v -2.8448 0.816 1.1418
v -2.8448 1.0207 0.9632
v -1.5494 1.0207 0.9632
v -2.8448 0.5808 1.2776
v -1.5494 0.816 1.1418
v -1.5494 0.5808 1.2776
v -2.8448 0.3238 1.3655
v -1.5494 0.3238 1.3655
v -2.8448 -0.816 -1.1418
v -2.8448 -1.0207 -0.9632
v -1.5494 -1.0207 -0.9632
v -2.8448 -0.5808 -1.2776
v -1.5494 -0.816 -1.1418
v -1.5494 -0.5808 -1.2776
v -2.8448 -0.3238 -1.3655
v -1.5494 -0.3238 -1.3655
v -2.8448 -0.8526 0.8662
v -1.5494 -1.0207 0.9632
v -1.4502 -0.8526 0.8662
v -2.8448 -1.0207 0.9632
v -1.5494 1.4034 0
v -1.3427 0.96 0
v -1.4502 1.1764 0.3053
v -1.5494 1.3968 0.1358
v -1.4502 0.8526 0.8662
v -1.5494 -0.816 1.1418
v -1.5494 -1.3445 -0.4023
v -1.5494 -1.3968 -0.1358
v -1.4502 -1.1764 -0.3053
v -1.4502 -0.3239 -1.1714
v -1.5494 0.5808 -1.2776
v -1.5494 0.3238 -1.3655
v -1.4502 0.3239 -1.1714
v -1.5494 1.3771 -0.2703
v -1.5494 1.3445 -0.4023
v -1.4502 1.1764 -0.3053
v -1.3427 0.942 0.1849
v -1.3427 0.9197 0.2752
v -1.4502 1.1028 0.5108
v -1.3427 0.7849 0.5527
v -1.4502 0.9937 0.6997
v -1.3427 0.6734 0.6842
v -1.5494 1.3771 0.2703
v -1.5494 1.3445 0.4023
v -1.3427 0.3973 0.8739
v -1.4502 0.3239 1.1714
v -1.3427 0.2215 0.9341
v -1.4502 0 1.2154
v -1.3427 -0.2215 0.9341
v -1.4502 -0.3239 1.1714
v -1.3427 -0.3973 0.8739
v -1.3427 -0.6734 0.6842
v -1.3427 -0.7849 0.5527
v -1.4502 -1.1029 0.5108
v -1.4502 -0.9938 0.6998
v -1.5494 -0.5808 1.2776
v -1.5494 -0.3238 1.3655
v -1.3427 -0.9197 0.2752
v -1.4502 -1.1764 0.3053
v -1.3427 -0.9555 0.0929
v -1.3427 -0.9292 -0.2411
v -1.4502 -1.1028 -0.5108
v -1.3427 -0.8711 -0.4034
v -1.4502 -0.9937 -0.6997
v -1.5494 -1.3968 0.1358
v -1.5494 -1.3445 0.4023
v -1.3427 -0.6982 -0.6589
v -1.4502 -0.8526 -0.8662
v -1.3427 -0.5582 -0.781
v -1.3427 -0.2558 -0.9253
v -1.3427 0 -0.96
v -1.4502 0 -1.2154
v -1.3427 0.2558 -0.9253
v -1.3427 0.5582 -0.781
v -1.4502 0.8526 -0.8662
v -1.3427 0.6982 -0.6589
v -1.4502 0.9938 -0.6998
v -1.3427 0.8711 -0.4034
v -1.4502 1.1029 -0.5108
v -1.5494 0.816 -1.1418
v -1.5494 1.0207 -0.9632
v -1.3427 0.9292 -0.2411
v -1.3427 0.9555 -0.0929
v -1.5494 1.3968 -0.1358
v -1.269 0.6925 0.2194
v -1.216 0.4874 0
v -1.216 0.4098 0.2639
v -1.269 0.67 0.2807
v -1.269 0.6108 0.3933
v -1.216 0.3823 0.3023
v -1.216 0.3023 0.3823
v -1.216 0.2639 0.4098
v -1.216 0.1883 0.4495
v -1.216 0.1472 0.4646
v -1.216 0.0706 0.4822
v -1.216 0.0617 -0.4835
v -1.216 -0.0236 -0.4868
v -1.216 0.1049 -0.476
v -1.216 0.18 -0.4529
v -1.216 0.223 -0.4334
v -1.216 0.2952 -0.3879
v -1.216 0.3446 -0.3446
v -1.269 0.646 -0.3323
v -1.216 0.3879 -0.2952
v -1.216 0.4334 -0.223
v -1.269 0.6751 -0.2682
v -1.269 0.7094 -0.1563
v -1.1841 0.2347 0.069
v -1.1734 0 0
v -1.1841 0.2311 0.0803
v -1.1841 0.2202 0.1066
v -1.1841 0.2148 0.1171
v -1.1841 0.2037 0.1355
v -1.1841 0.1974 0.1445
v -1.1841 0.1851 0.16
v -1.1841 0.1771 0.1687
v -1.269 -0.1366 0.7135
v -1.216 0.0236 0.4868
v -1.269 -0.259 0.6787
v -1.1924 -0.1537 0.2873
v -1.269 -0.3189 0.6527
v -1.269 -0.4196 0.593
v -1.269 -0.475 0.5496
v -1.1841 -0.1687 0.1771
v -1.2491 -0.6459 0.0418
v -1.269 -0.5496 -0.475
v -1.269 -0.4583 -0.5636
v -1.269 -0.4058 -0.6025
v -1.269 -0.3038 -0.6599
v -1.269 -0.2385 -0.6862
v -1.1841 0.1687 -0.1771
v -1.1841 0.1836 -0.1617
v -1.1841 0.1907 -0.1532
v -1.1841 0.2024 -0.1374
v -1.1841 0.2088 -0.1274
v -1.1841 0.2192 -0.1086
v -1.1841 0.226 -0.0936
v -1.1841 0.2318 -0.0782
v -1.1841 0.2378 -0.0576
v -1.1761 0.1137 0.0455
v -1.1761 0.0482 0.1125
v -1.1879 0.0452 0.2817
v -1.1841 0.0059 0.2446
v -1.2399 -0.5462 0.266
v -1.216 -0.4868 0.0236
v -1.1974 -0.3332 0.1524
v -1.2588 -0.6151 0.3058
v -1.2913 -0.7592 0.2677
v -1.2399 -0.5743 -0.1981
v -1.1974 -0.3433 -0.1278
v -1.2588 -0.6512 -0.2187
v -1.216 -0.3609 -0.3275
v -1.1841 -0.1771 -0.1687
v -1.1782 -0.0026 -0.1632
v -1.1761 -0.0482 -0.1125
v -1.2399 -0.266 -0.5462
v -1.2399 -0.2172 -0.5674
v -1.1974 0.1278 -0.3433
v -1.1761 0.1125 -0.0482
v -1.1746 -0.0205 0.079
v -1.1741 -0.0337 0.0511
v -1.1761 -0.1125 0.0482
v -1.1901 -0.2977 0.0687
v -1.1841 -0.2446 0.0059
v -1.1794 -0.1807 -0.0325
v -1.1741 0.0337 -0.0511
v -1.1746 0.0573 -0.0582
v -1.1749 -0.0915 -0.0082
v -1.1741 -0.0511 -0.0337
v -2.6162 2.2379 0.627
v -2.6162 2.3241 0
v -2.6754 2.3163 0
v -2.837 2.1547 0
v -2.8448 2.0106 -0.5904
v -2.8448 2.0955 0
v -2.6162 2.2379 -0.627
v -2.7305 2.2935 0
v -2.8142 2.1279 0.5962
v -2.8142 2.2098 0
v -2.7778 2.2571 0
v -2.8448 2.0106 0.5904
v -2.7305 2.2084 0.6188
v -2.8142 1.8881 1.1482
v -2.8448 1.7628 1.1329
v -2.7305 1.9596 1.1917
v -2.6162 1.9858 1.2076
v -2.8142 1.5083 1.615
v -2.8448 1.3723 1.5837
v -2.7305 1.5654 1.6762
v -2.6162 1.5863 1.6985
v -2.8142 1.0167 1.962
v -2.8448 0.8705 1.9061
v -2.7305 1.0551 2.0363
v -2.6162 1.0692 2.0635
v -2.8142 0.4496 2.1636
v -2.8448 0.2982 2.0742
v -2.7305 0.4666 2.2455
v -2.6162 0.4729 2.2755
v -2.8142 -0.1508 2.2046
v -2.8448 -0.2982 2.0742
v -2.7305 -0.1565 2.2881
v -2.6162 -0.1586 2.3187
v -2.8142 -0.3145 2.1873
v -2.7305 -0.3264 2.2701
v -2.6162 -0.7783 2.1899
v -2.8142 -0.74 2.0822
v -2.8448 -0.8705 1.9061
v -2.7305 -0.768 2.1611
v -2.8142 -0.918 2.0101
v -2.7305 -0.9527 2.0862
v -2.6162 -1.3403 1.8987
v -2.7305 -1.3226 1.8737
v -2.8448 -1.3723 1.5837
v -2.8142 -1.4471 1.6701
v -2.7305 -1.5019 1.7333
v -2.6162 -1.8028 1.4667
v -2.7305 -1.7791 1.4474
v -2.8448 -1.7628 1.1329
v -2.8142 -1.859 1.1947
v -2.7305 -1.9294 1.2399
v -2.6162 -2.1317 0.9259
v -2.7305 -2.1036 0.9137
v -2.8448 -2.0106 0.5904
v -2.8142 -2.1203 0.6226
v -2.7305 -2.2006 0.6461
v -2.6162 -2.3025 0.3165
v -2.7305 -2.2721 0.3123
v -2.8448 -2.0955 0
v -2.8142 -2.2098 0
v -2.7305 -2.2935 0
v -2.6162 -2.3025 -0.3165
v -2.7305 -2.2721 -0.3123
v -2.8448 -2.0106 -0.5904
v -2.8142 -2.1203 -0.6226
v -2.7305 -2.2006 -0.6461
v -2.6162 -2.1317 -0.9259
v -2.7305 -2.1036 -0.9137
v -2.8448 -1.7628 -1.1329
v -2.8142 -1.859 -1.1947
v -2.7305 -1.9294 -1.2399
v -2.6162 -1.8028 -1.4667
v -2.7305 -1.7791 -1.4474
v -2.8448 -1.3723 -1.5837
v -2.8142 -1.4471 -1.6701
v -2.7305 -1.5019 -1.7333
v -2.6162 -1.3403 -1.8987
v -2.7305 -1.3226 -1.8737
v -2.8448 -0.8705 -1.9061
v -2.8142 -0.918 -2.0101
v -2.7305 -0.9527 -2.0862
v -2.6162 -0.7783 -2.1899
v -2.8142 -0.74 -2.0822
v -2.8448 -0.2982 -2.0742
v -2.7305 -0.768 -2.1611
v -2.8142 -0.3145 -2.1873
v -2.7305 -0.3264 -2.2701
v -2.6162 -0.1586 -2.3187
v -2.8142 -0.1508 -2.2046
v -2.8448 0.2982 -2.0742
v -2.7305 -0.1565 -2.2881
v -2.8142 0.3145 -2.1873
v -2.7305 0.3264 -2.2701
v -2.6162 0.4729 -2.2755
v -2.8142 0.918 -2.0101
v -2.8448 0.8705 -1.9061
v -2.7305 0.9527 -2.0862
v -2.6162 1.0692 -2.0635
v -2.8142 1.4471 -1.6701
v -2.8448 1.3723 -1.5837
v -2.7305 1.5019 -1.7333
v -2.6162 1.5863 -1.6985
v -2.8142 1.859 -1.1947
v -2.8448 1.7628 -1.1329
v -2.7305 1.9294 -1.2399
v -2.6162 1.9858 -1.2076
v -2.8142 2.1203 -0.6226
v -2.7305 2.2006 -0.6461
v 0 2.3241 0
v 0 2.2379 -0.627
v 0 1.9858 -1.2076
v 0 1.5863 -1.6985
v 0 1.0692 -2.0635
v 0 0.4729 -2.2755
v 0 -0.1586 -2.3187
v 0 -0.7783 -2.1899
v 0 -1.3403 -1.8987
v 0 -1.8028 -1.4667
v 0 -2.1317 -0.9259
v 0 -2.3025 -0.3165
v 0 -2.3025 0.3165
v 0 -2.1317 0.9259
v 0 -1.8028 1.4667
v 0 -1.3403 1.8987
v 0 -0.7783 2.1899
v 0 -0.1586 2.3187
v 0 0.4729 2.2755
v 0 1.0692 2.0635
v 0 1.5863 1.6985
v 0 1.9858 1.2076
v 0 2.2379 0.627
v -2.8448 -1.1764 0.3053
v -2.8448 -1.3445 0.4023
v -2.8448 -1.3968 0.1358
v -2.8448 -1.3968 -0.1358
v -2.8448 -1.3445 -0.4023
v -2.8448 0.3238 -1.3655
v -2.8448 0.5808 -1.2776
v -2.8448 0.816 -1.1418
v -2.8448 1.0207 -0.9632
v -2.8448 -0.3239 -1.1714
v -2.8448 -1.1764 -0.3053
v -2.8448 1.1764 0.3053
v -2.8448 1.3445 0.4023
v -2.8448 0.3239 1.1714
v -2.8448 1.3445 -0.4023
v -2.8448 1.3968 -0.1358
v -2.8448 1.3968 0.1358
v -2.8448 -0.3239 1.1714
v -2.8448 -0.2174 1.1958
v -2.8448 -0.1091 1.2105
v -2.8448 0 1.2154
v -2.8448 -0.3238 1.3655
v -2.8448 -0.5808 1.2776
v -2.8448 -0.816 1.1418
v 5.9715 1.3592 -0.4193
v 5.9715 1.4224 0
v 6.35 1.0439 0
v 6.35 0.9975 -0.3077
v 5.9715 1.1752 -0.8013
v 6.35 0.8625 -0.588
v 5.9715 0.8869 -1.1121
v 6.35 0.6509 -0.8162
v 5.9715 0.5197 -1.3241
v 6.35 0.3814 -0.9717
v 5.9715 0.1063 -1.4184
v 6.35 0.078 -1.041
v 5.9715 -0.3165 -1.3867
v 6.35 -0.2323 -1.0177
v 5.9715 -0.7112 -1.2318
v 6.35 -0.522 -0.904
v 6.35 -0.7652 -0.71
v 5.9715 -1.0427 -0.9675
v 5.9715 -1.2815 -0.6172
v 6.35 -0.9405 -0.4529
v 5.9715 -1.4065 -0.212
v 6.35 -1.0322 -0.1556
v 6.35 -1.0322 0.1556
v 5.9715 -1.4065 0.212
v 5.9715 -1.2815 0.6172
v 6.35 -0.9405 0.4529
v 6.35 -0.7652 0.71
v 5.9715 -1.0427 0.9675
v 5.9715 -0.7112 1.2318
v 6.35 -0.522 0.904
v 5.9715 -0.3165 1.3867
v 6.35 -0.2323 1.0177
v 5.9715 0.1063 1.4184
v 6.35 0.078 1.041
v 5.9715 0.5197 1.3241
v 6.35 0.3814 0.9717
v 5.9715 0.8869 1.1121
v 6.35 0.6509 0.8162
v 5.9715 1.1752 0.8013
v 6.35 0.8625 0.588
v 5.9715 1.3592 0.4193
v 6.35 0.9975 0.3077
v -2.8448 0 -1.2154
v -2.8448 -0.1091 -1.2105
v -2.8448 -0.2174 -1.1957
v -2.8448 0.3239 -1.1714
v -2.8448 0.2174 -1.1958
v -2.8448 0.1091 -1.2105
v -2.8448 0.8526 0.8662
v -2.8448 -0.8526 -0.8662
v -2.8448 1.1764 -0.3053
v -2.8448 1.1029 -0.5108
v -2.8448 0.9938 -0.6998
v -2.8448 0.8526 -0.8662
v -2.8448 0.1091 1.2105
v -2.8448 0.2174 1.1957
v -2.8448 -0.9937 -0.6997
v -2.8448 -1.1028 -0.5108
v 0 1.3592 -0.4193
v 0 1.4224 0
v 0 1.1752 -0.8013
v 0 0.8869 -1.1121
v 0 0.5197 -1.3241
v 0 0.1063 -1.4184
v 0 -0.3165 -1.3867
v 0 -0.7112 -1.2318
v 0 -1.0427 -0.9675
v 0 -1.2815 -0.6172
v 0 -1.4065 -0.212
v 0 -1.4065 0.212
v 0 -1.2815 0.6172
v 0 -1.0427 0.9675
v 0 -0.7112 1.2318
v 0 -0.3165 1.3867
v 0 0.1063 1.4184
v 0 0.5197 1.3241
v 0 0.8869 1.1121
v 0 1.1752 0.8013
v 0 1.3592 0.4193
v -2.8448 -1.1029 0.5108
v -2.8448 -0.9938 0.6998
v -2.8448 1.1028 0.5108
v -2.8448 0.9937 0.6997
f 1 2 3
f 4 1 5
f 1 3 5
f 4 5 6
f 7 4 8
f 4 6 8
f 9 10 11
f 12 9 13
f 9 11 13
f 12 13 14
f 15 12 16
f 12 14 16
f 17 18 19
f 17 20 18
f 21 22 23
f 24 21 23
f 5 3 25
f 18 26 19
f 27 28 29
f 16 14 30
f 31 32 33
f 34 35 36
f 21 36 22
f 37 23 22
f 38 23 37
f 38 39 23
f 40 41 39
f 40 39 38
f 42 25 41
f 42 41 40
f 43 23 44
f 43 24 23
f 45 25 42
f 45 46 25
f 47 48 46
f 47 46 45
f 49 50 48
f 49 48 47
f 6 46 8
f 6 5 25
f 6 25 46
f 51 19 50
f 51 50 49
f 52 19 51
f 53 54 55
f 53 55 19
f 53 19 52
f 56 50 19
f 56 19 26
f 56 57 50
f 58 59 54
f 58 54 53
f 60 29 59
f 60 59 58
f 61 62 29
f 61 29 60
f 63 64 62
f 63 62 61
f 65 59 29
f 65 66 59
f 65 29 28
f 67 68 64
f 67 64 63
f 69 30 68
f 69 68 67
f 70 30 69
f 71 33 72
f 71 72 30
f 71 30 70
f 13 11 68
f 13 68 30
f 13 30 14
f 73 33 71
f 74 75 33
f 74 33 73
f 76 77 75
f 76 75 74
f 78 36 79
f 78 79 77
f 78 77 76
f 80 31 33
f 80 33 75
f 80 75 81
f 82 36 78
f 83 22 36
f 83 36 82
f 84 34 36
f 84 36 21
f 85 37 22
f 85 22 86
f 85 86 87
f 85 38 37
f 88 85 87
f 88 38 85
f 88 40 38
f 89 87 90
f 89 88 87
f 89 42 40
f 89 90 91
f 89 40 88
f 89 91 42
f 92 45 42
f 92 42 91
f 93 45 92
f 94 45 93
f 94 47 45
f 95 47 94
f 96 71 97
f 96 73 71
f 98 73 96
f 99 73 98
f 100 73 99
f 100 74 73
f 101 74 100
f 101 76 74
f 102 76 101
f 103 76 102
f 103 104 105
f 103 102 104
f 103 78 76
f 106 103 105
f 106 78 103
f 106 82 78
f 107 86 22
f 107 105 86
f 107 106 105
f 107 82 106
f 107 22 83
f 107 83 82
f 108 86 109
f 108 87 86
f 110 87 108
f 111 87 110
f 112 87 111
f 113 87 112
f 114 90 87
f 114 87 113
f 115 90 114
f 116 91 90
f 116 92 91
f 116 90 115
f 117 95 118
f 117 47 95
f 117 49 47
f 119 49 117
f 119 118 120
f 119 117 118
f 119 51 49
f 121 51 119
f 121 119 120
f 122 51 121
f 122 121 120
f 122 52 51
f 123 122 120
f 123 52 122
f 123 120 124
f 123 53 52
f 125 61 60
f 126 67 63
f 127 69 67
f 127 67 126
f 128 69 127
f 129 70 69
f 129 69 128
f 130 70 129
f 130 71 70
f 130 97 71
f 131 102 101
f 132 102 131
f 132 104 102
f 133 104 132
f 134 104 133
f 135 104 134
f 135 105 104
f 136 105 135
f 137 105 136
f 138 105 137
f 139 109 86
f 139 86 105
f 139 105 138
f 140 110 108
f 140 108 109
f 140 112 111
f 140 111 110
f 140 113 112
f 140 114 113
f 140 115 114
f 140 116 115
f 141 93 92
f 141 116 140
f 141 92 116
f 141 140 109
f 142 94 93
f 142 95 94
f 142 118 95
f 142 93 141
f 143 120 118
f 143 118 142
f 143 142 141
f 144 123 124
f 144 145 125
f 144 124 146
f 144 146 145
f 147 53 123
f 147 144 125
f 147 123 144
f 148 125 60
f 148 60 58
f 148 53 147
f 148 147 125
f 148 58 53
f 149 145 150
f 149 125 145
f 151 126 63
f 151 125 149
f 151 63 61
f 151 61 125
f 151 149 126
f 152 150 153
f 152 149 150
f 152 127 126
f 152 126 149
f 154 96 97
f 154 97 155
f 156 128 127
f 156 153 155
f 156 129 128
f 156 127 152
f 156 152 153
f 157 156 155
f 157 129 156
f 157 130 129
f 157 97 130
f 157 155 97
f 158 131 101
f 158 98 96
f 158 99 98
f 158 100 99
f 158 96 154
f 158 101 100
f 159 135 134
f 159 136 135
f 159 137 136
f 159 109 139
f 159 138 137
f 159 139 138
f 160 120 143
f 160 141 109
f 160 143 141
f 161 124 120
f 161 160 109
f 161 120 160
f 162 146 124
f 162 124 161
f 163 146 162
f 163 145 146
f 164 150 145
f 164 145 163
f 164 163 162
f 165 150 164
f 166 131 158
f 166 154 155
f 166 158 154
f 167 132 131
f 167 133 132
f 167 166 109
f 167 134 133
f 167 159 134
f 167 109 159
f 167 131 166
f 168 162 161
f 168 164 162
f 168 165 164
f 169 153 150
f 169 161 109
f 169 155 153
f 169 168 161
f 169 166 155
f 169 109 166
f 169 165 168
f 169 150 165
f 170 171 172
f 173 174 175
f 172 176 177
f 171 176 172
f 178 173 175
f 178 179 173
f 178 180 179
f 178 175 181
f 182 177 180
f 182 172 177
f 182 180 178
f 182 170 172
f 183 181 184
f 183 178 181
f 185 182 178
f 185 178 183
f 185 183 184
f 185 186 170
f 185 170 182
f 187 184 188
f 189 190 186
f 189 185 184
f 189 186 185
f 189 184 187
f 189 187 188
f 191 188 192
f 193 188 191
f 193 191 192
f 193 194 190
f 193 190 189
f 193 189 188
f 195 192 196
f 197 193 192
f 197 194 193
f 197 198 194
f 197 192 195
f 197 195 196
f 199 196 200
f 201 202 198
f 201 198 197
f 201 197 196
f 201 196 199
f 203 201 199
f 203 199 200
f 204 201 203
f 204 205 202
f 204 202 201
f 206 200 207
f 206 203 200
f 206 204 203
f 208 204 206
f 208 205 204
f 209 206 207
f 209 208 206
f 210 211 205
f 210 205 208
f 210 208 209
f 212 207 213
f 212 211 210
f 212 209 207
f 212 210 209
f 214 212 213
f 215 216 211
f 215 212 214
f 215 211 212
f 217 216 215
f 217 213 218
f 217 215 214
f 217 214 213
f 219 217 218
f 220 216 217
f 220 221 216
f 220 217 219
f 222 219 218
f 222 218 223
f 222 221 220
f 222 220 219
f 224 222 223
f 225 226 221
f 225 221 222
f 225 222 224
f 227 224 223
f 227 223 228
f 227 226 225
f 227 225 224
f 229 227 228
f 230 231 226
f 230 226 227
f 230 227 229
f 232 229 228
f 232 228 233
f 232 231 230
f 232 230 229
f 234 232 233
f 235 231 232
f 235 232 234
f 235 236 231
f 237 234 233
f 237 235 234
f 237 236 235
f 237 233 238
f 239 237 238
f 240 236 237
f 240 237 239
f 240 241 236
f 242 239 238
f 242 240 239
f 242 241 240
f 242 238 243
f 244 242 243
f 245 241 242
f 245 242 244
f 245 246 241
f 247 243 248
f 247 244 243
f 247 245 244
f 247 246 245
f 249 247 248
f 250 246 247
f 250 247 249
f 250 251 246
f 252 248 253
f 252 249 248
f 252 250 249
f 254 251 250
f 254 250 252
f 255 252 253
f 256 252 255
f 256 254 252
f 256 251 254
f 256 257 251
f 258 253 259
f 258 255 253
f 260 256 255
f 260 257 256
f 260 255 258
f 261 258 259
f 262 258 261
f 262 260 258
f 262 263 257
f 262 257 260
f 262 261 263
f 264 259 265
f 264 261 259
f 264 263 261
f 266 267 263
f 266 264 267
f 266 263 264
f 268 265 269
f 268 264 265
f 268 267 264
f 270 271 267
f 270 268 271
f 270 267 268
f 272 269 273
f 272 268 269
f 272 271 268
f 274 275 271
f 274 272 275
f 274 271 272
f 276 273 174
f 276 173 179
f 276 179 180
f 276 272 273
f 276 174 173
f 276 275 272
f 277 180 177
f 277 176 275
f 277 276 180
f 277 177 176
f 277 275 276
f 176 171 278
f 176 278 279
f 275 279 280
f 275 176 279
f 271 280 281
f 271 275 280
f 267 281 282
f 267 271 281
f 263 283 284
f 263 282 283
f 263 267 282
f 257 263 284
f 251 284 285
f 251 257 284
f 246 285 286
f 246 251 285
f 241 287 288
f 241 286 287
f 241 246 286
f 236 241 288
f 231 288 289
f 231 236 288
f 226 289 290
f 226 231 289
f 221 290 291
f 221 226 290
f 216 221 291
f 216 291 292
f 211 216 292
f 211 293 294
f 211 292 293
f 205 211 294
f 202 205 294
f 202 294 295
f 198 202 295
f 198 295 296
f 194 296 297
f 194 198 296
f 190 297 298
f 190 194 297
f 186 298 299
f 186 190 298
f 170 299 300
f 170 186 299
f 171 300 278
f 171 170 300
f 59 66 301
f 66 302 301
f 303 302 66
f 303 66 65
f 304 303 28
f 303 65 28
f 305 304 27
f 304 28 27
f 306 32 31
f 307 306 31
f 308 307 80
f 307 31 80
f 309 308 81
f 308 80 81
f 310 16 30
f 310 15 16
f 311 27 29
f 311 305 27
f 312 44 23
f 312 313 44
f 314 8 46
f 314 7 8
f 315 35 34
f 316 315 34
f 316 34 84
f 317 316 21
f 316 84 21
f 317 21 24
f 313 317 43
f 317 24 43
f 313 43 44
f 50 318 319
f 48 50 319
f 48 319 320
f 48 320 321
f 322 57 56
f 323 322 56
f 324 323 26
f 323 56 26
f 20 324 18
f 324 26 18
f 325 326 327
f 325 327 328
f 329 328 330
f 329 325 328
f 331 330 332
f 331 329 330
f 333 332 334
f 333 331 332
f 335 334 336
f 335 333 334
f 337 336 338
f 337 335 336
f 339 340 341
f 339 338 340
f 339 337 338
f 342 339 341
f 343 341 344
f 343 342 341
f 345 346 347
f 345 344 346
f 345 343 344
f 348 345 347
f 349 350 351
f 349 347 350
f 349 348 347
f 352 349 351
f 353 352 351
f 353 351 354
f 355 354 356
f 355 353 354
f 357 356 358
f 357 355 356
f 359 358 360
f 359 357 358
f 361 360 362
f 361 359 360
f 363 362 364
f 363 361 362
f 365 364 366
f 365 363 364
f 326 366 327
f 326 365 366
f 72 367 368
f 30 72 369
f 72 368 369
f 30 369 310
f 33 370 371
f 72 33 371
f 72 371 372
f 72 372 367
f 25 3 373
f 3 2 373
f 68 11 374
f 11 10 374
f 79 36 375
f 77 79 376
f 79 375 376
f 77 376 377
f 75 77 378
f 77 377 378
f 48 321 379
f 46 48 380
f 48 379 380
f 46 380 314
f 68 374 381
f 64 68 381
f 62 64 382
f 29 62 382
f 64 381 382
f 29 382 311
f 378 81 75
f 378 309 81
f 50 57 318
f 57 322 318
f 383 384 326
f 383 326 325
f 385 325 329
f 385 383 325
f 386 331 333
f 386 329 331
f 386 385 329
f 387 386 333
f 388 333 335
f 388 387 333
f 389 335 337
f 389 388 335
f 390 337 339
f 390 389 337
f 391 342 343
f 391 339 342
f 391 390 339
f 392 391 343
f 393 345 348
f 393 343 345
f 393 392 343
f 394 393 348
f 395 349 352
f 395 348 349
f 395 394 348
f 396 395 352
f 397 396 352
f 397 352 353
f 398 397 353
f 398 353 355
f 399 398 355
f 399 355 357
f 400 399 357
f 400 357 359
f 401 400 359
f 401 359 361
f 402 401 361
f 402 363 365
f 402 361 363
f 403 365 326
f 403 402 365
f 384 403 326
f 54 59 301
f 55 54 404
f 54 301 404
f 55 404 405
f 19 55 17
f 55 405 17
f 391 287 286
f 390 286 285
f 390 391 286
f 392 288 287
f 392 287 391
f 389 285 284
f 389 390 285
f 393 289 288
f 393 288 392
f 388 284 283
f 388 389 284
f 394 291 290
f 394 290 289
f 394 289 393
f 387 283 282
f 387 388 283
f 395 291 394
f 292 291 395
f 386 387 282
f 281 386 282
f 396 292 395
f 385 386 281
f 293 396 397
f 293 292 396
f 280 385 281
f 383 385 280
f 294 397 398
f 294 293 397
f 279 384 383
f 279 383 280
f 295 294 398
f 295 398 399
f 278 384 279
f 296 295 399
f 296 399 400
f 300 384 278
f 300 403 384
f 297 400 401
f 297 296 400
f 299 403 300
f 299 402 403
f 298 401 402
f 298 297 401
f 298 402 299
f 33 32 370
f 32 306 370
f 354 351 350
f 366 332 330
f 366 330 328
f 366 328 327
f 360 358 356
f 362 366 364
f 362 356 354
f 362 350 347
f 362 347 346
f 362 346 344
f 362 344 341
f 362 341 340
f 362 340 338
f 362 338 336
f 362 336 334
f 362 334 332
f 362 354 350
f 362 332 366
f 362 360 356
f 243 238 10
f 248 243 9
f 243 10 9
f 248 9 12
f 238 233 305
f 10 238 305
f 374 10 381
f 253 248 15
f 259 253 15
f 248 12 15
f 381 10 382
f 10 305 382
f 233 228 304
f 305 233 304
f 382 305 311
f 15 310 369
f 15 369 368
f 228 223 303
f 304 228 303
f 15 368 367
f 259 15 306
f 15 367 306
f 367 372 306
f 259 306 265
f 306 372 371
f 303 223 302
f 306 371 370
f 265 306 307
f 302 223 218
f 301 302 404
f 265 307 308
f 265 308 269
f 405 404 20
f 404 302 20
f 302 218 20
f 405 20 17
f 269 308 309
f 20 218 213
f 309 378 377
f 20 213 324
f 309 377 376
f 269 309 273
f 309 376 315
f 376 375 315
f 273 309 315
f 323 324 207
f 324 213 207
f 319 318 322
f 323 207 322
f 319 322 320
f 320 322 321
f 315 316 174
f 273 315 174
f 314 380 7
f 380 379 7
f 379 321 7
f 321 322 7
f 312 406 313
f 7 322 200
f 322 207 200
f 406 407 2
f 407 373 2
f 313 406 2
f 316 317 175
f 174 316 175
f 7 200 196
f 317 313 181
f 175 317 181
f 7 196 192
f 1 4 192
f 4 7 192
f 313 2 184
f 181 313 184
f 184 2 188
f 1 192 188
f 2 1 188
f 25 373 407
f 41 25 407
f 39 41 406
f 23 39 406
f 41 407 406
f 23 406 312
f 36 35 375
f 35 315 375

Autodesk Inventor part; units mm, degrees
ref_plane "YZ Plane" through (0, 0, 0) normal (1, 0, 0) x (0, 1, 0)
sketch "Sketch1" plane through (0, 0, 0) normal (0, 0, 1) x (1, 0, 0)
  line L0 (-2.8448, 0) -> (6.35, 0)
  line L1 (6.35, 0) -> (6.35, 1.4224)
  line L2 (6.35, 1.4224) -> (0, 1.4224)
  line L3 (0, 1.4224) -> (0, 2.3241)
  line L4 (-7.3162, 0) -> (16.036, 0) projected
  line L5 (0, -0.4648) -> (0, 2.7889) projected
  line L6 (0, 2.3241) -> (-2.8448, 2.3241)
  line L7 (-2.8448, 0) -> (-2.8448, 2.3241)
  arc A0 (-1.1734, 0) -> (-1.5494, 1.4034) centre (-3.9802, 0) ccw
  line L8 (-2.8448, 1.4034) -> (-1.5494, 1.4034)
  line L9 (12.7, 1.4224) -> (0, 1.4224) construction
  dimension "d0" = 6.35
  dimension "d1" = 2.8448
  dimension "d2" = 2.8448
  dimension "d5" = 4.6482
  dimension "d13" = 2.8068
  dimension "d14" = 2.8068
  dimension "d15" = 1.2954
revolve "Body" add sketch "Sketch1" angle 360 about axis through (-2.8448, 0, 0) along (1, 0, 0) contours A0 L8 L7 L6 L3 L5 L0 | L5 L2 L1 L0
ref_plane "IDS_WORKPLANE{1}" through (-2.8448, 0, 0) normal (1, 0, 0) x (0, 0, -1)
sketch "Sketch2" plane through (-2.8448, 0, 0) normal (1, 0, 0) x (0, 0, -1)
  line L0 (0, -3.6027) -> (0, 5.3473) projected
  line L1 (5.6384, 0) -> (-3.6512, 0) projected
  circle A0 centre (0, 0) radius 2.3241 projected
  line L2 (1.3655, 0.3238) -> (1.1714, 0.3239)
  line L3 (0, 0) -> (1.3655, 0.3238) construction
  line L4 (0, 0) -> (4.3113, 4.0687) construction
  line L5 (0, 0) -> (0.4023, 1.3445) construction
  line L6 (0, 0) -> (0.7017, 1.2154) construction
  line L7 (0.4023, 1.3445) -> (0.3053, 1.1764)
  line L8 (0.9632, 1.0207) -> (0.8662, 0.8526)
  line L9 (0, 0) -> (0.9632, 1.0207) construction
  arc A1 (1.2154, 0) -> (1.1714, 0.3239) centre (0, 0) ccw
  arc A2 (0.8662, 0.8526) -> (0.3053, 1.1764) centre (0, 0) ccw
  arc A3 (1.4034, 0) -> (1.3655, 0.3238) centre (0, 0) ccw
  arc A4 (0.9632, 1.0207) -> (0.4023, 1.3445) centre (0, 0) ccw
  arc A5 (1.3655, 0.3238) -> (0.8276, 1.1334) centre (0, 0) ccw construction
  arc A6 (1.1714, 0.3239) -> (0.8662, 0.8526) centre (0, 0) ccw construction
  line L10 (1.3655, -0.3238) -> (1.1714, -0.3239)
  line L11 (0.4023, -1.3445) -> (0.3053, -1.1764)
  line L12 (0.9632, -1.0207) -> (0.8662, -0.8526)
  arc A7 (1.1714, -0.3239) -> (1.2154, 0) centre (0, 0) ccw
  arc A8 (0.3053, -1.1764) -> (0.8662, -0.8526) centre (0, 0) ccw
  arc A9 (1.3655, -0.3238) -> (1.4034, 0) centre (0, 0) ccw
  arc A10 (0.4023, -1.3445) -> (0.9632, -1.0207) centre (0, 0) ccw
  line L13 (-1.3655, 0.3238) -> (-1.1714, 0.3239)
  line L14 (-0.4023, 1.3445) -> (-0.3053, 1.1764)
  line L15 (-0.9632, 1.0207) -> (-0.8662, 0.8526)
  arc A11 (-1.1714, 0.3239) -> (-1.2154, 0) centre (0, 0) ccw
  arc A12 (-0.3053, 1.1764) -> (-0.8662, 0.8526) centre (0, 0) ccw
  arc A13 (-1.3655, 0.3238) -> (-1.4034, 0) centre (0, 0) ccw
  arc A14 (-0.4023, 1.3445) -> (-0.9632, 1.0207) centre (0, 0) ccw
  line L16 (-0.4023, -1.3445) -> (-0.3053, -1.1764)
  arc A15 (-0.8662, -0.8526) -> (-0.3053, -1.1764) centre (0, 0) ccw
  line L17 (-0.9632, -1.0207) -> (-0.8662, -0.8526)
  arc A16 (-0.9632, -1.0207) -> (-0.4023, -1.3445) centre (0, 0) ccw
  arc A17 (-1.2154, 0) -> (-1.1714, -0.3239) centre (0, 0) ccw
  line L18 (-1.3655, -0.3238) -> (-1.1714, -0.3239)
  arc A18 (-1.4034, 0) -> (-1.3655, -0.3238) centre (0, 0) ccw
  point P0 (0.7017, -1.2154)
  point P1 (-0.7017, 1.2154)
  point P2 (-0.7017, -1.2154)
  dimension "d19" = 0.3239
  dimension "d20" = 0.6477
  dimension "d21" = 33.316
  dimension "d22" = 2.8068
  dimension "d23" = 2.4308
extrude "Slot" add sketch "Sketch2" along normal up to next contours A1 L2 A3 L1 | L1 A9 L10 A7 | A17 L18 A18 L1 | L1 A13 L13 A11 | A4 L8 A2 L7 | L11 A8 L12 A10 | L14 A12 L15 A14 | A16 L17 A15 L16
fillet "Fillet1" radius 0.2286 1 edges at (-2.8448, -2.3241, 0)
thread "Thread" size "4-40 UNC" class "2A" standard "ANSI Unified Screw Threads" length 4.7625
chamfer "Chamfer1" distance 0.3785 distance2 0.3785 1 edges at (6.35, -1.4224, 0) measured on face at (6.35, -0.3549, 0.3144)
ref_plane "Work Plane2" through (-1.4224, 0, 0) normal (0, 0, -1) x (1, 0, 0)
equation "\"d19\" = 0.5 * SBR"
equation "\"d20\" = SBR"
equation "\"d22\" = 1.1547 * SW"
equation "\"d23\" = SW"
equation "\"d17\" = INTI"
equation "\"d24\" = RR"
equation "\"d6\" = GEL"
equation "\"d9\" = -0.5 * SPD + 0.5 * NND"
equation "\"d10\" = GUL"
equation "\"d0\" = NLG"
equation "\"d1\" = KOH"
equation "\"d2\" = NND"
equation "\"d5\" = KOD"
equation "\"d13\" = 1.1547 * SW"
equation "\"d14\" = 1.1547 * SW"
equation "\"d15\" = INTI"
equation "\"NND\" = 2.8448"
equation "\"NLG\" = 6.35"
equation "\"GEL\" = 4.7625"
equation "\"KOD\" = 4.6482"
equation "\"KOH\" = 2.8448"
equation "\"SPD\" = GD1"
equation "\"GUL\" = 0.37846"
equation "\"SBR\" = 0.6477"
equation "\"INTI\" = 1.2954"
equation "\"d11\" = -KOH"
equation "\"SW\" = 2.43078"
equation "\"d16\" = 1.1547 * SW"
equation "\"d18\" = SW"
equation "\"RR\" = 0.2286"
equation "\"TOA\" = 30deg"
equation "\"GD1\" = 2.08788"
equation "\"THREADDIA\" = 2.8448"
equation "\"BDM\" = NND"
equation "\"GD\" = NND"
equation "\"GAL\" = 1.5875"
equation "\"E0\" = 2.86258"
properties part number "ANSI B18.3 - 4-40 UNC - 0.25, SSHCSI" material "Steel, Mild"
